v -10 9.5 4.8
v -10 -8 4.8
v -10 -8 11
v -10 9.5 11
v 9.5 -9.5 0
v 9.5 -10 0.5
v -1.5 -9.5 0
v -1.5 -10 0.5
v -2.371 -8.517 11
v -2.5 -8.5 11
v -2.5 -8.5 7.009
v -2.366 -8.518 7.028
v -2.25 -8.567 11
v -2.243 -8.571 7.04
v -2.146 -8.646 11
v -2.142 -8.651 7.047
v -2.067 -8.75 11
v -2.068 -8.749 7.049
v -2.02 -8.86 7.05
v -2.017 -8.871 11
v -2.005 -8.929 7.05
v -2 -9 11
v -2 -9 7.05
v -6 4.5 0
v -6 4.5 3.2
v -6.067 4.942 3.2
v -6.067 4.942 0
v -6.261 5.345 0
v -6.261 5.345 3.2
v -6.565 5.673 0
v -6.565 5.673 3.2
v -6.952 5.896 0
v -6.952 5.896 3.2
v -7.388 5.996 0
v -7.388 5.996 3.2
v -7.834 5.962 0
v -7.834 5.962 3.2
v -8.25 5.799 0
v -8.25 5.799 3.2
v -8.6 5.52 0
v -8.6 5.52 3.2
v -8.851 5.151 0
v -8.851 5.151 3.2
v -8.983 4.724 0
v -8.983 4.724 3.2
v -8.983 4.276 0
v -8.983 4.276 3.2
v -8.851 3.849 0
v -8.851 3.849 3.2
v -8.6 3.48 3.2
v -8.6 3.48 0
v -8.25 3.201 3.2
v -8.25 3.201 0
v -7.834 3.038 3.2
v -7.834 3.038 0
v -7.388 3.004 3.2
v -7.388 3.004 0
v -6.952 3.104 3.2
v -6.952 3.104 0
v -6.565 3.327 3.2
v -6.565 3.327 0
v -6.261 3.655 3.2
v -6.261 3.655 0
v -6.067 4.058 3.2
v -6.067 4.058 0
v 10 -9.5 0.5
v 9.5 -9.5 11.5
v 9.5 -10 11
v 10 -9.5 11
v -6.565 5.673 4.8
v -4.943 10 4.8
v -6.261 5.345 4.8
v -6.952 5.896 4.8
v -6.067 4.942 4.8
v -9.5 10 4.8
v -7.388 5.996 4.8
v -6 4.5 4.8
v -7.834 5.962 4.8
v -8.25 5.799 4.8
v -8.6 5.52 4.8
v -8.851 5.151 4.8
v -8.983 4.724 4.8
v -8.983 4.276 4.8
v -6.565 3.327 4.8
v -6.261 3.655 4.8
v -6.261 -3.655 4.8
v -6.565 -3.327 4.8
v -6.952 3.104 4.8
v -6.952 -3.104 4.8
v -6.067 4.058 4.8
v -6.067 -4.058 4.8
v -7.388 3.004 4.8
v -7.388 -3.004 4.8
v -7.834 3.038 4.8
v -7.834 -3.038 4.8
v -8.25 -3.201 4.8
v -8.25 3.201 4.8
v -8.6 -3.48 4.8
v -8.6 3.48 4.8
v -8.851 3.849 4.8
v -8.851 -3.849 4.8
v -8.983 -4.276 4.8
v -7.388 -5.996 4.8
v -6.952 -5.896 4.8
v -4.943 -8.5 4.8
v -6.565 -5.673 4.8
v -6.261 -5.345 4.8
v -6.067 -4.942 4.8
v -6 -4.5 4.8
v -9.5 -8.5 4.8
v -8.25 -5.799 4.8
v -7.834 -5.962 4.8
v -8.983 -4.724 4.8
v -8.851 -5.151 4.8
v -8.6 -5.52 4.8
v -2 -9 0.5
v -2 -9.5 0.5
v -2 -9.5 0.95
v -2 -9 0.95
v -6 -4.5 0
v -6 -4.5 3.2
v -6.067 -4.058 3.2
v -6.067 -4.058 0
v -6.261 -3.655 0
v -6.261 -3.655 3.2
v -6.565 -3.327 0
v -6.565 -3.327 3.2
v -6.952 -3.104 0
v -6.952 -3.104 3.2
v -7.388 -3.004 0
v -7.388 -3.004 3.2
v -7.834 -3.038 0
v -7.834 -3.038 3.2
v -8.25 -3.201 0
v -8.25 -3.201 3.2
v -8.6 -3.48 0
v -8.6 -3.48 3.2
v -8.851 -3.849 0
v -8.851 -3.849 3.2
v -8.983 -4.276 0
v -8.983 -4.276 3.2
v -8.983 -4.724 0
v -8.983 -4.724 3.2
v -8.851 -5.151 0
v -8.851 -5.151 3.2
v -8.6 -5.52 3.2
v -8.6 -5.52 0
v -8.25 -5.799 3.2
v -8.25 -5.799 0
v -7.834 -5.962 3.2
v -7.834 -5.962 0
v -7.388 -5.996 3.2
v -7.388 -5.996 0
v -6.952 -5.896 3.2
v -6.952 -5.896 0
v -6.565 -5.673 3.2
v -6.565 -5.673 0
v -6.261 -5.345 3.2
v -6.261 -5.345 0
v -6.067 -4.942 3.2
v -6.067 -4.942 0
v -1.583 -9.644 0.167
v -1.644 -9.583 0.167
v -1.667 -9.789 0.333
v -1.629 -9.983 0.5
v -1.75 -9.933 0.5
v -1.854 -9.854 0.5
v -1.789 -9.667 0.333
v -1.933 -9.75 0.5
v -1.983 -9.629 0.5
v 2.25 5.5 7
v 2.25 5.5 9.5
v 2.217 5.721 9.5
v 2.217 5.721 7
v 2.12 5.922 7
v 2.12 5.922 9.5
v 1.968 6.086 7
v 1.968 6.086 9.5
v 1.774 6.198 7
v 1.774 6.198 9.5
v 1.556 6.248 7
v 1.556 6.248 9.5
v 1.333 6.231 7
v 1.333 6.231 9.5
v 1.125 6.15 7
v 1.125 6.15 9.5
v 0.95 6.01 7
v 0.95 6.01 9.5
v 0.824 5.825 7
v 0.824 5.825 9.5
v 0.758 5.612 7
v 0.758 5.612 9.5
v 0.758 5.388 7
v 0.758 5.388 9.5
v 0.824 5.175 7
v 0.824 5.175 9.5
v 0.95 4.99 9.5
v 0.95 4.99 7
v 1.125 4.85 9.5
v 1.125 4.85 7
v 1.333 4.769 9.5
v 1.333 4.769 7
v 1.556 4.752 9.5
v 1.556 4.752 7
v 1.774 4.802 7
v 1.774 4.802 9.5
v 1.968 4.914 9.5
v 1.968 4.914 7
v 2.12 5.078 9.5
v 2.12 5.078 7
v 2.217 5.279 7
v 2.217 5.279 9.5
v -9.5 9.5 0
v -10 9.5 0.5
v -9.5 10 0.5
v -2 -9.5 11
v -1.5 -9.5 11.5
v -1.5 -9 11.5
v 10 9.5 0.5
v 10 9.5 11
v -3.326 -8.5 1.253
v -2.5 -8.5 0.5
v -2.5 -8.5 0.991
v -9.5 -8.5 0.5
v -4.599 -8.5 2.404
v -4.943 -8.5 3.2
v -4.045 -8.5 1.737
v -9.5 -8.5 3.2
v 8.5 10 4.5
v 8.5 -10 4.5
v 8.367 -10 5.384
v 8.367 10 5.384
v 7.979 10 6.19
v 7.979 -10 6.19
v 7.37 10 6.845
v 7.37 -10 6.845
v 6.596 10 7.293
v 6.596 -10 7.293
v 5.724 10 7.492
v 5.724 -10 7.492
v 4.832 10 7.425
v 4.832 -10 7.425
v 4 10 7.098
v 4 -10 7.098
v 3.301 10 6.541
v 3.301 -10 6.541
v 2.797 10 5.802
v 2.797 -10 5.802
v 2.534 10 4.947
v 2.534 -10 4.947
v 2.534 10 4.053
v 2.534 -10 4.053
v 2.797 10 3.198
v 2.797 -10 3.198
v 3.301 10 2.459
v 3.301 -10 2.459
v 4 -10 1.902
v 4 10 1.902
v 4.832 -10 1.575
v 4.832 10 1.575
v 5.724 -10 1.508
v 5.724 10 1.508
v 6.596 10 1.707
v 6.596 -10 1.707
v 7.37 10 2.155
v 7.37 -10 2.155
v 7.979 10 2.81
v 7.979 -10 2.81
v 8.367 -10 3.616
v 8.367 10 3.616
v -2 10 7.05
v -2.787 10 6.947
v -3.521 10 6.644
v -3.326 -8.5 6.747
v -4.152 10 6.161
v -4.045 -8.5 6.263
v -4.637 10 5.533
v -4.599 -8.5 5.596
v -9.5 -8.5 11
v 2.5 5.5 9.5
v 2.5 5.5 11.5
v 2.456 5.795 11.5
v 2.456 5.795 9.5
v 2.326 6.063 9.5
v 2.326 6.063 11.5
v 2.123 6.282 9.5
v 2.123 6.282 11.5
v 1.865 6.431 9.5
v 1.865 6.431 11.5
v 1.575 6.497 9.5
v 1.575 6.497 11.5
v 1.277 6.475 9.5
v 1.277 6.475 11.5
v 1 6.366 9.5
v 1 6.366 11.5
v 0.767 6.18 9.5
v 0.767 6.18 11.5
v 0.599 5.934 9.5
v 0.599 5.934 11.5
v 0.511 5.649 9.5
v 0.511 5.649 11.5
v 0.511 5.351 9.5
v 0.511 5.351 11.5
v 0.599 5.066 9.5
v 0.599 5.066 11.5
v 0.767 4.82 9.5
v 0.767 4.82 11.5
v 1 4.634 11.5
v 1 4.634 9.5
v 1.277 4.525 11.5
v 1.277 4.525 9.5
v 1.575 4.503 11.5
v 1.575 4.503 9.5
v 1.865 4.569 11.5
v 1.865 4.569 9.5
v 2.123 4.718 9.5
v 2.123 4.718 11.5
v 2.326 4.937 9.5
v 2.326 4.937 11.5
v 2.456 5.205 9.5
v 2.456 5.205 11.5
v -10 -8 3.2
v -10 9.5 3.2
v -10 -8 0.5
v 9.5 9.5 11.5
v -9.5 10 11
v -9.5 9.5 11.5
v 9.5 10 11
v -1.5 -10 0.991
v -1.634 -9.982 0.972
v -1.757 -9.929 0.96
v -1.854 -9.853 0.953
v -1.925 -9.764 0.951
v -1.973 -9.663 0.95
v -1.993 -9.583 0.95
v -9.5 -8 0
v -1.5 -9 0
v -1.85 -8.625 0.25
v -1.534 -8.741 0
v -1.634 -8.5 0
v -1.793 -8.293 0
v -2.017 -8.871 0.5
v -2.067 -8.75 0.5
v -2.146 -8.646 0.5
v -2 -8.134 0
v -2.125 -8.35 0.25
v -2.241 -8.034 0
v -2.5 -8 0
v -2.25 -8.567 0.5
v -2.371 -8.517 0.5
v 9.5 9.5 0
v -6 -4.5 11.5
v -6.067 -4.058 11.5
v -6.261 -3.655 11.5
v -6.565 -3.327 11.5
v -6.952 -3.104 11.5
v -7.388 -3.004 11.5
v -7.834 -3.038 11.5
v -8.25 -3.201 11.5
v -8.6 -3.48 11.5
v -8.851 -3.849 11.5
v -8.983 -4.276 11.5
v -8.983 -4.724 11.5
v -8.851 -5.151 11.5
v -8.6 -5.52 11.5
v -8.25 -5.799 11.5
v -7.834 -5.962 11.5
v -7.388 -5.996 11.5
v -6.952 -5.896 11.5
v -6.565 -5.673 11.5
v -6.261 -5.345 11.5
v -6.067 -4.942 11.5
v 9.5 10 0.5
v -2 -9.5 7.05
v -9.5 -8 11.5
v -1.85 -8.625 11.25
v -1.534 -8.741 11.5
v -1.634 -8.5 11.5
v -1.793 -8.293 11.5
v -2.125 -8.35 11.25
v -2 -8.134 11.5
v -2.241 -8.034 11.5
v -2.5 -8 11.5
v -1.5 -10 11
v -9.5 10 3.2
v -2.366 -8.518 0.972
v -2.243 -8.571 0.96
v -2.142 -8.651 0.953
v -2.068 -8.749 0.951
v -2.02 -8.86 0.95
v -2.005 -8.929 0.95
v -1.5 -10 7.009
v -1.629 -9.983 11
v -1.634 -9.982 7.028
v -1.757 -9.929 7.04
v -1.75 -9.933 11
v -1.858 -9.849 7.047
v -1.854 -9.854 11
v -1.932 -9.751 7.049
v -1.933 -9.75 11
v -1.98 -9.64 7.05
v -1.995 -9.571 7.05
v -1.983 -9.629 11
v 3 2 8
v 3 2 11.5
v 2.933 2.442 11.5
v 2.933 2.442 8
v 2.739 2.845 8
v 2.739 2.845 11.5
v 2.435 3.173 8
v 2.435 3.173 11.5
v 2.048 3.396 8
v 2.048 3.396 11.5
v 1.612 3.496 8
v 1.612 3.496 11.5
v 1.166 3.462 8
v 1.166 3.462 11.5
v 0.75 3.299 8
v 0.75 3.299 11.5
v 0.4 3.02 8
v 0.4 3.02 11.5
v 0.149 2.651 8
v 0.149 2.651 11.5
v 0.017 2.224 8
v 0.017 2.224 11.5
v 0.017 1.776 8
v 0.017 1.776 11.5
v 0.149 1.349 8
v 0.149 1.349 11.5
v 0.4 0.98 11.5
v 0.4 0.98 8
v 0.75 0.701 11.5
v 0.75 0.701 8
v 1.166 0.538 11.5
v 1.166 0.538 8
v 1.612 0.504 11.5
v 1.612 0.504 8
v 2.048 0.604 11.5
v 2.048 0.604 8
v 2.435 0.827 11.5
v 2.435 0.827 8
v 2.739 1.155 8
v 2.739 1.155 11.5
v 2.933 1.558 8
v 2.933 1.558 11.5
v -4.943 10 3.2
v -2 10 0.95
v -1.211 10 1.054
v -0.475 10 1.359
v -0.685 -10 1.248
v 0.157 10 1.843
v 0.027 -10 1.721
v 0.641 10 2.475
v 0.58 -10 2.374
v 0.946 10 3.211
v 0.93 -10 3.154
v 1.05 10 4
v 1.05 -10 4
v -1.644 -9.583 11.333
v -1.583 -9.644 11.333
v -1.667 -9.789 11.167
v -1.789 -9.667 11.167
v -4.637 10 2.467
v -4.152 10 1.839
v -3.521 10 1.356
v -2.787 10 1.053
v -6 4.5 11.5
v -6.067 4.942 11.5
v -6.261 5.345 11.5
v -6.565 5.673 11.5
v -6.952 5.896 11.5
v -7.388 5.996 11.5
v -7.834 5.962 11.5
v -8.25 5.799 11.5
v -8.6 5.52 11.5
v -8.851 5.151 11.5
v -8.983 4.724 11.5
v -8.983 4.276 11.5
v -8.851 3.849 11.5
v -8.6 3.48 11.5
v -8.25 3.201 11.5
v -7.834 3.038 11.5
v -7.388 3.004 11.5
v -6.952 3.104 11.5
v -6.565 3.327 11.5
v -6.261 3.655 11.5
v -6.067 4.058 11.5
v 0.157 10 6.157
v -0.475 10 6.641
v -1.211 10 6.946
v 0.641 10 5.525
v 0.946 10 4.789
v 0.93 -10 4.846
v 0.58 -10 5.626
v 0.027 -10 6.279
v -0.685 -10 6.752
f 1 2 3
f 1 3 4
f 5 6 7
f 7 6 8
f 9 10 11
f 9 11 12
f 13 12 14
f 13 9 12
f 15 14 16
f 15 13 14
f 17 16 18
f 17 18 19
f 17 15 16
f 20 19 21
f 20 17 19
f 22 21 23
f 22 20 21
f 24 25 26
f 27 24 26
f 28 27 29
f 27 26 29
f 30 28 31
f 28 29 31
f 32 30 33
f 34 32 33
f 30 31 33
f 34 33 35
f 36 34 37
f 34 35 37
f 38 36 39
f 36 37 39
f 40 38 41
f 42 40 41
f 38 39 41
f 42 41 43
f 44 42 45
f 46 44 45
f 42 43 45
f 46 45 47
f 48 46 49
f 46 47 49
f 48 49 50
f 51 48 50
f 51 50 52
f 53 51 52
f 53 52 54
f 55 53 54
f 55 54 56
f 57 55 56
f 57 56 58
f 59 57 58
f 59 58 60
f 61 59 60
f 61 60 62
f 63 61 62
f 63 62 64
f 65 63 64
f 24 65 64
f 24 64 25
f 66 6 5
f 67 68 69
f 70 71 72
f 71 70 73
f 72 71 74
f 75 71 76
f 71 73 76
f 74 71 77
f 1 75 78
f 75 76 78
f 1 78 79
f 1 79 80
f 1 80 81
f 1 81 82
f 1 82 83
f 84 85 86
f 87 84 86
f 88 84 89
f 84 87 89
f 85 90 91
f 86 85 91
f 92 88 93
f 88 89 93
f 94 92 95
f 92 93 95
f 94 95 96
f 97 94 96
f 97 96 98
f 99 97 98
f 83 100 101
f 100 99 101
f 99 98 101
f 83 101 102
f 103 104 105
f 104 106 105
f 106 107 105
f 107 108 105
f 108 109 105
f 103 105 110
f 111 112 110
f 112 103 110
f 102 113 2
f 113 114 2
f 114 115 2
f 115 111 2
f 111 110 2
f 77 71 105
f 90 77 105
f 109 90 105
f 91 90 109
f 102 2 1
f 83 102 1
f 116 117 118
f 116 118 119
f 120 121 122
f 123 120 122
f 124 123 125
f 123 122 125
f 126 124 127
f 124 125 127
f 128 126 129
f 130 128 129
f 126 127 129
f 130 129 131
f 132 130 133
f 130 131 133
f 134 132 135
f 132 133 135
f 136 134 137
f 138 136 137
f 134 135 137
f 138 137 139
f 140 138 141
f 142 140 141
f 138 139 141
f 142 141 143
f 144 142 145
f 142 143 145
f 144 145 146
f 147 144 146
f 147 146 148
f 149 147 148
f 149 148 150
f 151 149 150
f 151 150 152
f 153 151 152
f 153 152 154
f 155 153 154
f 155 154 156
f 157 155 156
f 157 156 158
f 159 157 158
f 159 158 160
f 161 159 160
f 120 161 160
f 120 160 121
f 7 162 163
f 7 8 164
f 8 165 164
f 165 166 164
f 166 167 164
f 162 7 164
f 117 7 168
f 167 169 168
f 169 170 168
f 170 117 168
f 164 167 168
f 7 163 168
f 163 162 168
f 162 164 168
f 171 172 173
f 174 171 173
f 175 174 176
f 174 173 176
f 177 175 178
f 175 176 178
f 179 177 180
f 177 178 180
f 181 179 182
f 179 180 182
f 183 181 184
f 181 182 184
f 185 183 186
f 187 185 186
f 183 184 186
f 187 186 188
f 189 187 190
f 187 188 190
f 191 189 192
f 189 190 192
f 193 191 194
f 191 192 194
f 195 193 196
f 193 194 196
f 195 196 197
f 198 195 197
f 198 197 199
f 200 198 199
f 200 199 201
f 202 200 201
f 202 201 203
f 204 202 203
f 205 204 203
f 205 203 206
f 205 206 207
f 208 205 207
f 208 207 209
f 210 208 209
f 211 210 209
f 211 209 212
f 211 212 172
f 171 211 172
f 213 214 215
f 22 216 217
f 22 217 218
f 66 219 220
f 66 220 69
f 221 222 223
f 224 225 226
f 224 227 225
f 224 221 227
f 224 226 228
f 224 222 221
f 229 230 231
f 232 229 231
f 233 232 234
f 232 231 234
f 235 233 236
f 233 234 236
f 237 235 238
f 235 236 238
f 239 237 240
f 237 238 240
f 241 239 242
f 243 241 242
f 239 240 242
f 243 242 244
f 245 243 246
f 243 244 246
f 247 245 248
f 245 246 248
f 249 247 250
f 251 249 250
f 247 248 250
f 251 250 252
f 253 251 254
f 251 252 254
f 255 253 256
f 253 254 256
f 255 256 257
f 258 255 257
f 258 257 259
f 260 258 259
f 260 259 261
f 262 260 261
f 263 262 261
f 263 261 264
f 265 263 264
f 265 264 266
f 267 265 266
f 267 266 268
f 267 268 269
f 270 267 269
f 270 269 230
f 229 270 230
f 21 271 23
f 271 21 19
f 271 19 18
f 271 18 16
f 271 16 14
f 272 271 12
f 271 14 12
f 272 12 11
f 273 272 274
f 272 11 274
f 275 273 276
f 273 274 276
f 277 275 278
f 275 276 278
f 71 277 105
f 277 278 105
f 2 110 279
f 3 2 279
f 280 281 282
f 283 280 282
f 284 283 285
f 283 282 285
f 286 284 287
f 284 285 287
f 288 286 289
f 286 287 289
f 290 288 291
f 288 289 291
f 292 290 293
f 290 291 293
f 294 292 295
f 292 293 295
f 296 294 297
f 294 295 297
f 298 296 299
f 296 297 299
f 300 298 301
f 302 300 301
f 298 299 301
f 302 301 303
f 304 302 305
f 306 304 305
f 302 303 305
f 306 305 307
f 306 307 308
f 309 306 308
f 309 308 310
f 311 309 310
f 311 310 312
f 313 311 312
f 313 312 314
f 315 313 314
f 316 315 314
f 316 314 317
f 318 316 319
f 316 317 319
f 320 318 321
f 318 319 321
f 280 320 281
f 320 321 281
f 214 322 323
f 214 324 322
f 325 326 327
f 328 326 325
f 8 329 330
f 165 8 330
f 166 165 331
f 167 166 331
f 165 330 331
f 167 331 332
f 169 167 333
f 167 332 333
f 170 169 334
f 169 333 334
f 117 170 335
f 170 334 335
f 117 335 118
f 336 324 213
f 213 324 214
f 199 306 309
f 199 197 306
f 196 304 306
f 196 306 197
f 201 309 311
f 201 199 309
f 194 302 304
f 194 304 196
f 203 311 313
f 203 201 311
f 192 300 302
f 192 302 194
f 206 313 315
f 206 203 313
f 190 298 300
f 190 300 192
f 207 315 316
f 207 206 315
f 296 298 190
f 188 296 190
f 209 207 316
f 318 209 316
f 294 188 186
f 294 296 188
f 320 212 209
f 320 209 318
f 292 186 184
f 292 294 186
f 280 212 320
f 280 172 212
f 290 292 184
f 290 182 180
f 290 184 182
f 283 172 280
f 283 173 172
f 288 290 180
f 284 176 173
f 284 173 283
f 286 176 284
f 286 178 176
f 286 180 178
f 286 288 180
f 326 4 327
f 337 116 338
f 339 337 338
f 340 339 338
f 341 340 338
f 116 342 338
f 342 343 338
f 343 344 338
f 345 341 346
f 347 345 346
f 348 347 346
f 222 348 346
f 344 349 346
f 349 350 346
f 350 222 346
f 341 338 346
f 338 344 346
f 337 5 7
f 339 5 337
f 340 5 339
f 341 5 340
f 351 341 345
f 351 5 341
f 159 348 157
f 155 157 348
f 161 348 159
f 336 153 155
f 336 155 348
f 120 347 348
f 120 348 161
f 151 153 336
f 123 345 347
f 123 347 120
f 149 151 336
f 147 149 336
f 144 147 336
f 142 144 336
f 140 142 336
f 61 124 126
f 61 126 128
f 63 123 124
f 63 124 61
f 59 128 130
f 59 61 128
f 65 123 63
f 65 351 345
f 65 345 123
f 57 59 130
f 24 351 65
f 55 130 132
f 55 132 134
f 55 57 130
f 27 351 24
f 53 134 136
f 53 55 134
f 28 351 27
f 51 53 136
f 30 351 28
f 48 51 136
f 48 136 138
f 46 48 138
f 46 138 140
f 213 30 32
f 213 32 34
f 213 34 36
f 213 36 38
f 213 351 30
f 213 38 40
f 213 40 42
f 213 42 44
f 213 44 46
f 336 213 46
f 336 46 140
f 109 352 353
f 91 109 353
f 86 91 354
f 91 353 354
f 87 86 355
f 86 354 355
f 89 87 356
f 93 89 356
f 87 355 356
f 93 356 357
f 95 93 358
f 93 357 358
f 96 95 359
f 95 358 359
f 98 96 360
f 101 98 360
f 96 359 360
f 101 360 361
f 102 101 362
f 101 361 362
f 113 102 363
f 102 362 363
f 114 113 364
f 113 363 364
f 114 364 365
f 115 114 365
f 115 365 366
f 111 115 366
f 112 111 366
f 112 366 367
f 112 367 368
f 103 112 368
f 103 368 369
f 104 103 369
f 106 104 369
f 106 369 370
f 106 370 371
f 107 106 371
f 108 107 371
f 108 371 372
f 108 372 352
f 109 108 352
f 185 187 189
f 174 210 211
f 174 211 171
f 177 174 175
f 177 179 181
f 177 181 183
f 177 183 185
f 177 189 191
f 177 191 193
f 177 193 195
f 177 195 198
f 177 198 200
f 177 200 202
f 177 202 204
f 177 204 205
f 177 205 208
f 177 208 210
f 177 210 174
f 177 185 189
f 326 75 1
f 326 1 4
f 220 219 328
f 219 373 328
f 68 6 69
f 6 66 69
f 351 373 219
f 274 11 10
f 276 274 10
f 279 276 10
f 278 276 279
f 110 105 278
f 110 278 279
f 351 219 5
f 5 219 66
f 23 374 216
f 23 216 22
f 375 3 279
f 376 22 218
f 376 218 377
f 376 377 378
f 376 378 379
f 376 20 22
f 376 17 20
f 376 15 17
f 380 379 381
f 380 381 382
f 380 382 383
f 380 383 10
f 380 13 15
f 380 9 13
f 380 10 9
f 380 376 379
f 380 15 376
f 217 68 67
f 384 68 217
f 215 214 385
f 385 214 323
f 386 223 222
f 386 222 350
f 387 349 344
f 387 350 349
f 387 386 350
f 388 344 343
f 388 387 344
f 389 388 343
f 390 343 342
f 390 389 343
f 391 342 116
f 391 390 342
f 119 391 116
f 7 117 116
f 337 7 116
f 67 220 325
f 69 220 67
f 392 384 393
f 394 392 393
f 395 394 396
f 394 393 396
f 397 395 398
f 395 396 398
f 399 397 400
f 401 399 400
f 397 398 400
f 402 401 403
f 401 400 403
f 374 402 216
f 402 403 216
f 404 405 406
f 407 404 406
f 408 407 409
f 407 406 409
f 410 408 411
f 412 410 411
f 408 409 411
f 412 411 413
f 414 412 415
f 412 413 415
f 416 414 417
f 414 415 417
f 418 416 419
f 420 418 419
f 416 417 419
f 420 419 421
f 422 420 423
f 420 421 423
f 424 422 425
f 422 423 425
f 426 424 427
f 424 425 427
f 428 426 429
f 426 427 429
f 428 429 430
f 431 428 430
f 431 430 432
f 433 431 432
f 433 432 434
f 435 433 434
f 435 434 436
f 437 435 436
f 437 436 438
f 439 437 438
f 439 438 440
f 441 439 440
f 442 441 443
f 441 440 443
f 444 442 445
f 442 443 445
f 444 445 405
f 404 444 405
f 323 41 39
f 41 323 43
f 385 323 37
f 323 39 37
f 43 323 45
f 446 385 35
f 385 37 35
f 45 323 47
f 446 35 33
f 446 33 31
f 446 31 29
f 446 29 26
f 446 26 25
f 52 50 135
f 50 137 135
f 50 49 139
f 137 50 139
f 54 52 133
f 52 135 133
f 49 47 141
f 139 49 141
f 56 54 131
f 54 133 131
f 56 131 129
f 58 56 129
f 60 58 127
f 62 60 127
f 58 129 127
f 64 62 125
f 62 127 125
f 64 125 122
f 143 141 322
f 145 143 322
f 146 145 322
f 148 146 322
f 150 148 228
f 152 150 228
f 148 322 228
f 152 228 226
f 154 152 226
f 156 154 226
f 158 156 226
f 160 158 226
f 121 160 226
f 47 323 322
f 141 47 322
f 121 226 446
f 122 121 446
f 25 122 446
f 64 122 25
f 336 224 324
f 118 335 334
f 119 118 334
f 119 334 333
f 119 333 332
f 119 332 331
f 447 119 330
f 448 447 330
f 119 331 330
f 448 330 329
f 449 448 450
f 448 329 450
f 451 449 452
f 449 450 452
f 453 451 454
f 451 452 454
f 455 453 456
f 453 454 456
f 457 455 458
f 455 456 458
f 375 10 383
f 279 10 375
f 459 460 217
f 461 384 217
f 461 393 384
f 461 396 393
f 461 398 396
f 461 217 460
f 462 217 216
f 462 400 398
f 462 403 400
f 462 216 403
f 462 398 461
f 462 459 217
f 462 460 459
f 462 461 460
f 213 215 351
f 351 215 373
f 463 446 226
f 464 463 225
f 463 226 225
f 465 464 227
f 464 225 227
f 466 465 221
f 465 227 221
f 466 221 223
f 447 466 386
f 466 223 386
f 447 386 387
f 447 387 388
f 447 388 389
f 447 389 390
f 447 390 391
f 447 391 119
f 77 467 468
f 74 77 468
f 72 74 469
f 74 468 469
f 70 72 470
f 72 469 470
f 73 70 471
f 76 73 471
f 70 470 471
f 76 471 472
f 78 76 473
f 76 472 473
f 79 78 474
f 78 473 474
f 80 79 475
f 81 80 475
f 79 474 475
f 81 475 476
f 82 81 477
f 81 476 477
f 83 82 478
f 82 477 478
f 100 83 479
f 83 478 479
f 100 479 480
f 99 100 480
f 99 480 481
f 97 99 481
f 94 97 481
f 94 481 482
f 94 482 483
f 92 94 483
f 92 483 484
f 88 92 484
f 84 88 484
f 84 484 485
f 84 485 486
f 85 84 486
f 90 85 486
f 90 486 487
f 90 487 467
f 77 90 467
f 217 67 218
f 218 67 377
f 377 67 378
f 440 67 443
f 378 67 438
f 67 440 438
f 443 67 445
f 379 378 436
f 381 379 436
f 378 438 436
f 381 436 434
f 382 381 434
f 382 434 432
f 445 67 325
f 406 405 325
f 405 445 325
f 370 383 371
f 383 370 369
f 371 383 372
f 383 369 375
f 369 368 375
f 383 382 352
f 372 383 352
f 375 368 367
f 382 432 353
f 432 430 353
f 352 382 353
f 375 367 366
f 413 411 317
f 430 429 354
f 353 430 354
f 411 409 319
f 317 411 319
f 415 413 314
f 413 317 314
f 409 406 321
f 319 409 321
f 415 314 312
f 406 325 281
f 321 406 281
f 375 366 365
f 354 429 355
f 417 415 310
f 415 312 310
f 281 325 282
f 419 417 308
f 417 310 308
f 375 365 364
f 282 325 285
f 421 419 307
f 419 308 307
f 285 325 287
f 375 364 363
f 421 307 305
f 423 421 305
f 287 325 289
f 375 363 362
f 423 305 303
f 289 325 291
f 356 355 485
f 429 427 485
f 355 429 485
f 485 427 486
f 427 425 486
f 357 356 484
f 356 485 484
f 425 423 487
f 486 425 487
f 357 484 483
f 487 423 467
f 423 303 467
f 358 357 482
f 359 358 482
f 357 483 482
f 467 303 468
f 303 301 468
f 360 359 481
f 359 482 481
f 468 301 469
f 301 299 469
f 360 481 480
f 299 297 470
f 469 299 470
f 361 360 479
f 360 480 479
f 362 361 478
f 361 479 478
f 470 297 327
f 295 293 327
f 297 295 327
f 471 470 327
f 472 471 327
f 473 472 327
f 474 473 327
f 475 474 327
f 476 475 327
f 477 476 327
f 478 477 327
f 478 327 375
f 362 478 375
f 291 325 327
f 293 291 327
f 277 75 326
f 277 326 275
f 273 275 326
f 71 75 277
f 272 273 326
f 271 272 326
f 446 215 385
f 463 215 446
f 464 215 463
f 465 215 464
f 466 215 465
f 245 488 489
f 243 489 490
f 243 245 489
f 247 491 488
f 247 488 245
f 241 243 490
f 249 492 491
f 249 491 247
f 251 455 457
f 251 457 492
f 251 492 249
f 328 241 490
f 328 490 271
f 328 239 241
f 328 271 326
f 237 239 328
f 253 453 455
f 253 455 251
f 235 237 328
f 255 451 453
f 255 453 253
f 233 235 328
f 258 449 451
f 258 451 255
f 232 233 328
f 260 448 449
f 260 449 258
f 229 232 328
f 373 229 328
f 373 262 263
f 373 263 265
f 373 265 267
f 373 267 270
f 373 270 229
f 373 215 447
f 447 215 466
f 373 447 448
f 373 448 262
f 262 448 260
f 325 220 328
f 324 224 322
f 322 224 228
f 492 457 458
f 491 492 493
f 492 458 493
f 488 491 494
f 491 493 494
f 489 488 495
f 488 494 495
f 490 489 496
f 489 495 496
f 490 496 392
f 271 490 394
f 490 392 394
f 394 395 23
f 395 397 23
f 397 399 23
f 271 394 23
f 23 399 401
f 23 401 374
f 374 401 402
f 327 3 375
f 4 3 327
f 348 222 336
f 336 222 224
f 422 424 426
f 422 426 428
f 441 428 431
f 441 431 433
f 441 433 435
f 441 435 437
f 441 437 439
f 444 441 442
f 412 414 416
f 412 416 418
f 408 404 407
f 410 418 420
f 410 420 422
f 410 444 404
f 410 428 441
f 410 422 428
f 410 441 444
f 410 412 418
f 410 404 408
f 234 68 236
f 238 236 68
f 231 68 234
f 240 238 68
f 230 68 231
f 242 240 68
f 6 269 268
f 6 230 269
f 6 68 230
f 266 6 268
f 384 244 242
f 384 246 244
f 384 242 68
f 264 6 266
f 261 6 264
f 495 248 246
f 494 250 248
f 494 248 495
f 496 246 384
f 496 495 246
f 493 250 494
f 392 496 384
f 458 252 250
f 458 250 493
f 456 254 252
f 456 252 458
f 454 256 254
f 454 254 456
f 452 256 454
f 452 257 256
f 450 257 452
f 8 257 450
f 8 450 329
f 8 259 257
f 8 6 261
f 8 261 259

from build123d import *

# Parameters (mm, degrees)
BOSS_EXTRUDE1_DEPTH = 11.5
SKETCH2_R           = 1.5
CUT_EXTRUDE1_DEPTH  = 19.227726134
SKETCH2_3_R         = 0.75
CUT_EXTRUDE2_DEPTH  = 4.5
SKETCH2_4_R         = 1
CUT_EXTRUDE3_DEPTH  = 2
SKETCH2_5_R         = 1.5
CUT_EXTRUDE4_DEPTH  = 3.5
CUT_EXTRUDE5_DEPTH  = 26.144581921
SKETCH3_4_R         = 3
CUT_EXTRUDE6_DEPTH  = 26.144581921
FILLET1_R           = 0.5
CHAMFER1_SIZE       = 0.5


with BuildPart() as part:
    # Sketch1 → Boss-Extrude1 (new body)
    with BuildSketch(Plane.XY):
        Polygon((-10, 10), (10, 10), (10, -10), (-2, -10), (-2, -8.5), (-10, -8.5), align=None)
    extrude(amount=BOSS_EXTRUDE1_DEPTH)

    # Sketch2 → Cut-Extrude1 (cut, through all)
    with BuildSketch(Plane.XY.offset(11.5)):
        with Locations((-7.5, 4.5)):
            Circle(SKETCH2_R)
        with Locations((-7.5, -4.5)):
            Circle(SKETCH2_R)
    extrude(amount=-CUT_EXTRUDE1_DEPTH, mode=Mode.SUBTRACT)

    # Sketch2<3> → Cut-Extrude2 (cut)
    with BuildSketch(Plane.XY.offset(11.5)):
        with Locations((1.5, 5.5)):
            Circle(SKETCH2_3_R)
    extrude(amount=-CUT_EXTRUDE2_DEPTH, mode=Mode.SUBTRACT)

    # Sketch2<4> → Cut-Extrude3 (cut)
    with BuildSketch(Plane.XY.offset(11.5)):
        with Locations((1.5, 5.5)):
            Circle(SKETCH2_4_R)
    extrude(amount=-CUT_EXTRUDE3_DEPTH, mode=Mode.SUBTRACT)

    # Sketch2<5> → Cut-Extrude4 (cut)
    with BuildSketch(Plane.XY.offset(11.5)):
        with Locations((1.5, 2)):
            Circle(SKETCH2_5_R)
    extrude(amount=-CUT_EXTRUDE4_DEPTH, mode=Mode.SUBTRACT)

    # Sketch3 → Cut-Extrude5 (cut, through all)
    with BuildSketch(Plane.XZ.offset(10)):
        with BuildLine():
            Line((-4.943212531, 4.8), (-10, 4.8))
            Line((-10, 4.8), (-10, 3.2))
            Line((-10, 3.2), (-4.943212531, 3.2))
            ThreePointArc((-4.943212531, 3.2), (1.05, 4), (-4.943212531, 4.8))
        make_face()
    extrude(amount=-CUT_EXTRUDE5_DEPTH, mode=Mode.SUBTRACT)

    # Sketch3<4> → Cut-Extrude6 (cut, through all)
    with BuildSketch(Plane.XZ.offset(10)):
        with Locations((5.5, 4.5)):
            Circle(SKETCH3_4_R)
    extrude(amount=-CUT_EXTRUDE6_DEPTH, mode=Mode.SUBTRACT)

    # Fillet1
    fillet1_edges = [part.edges().sort_by_distance(p)[0] for p in [
        (-2, -8.5, 0.475),
        (-2, -10, 9.275),
        (-2, -8.5, 9.275),
        (-2, -10, 0.475),
    ]]
    fillet(fillet1_edges, radius=FILLET1_R)

    # Chamfer1
    chamfer1_edges = [part.edges().sort_by_distance(p)[0] for p in [
        (4.25, -10, 0),
        (-6.25, -8.5, 11.5),
        (-1.853553391, -9.853553391, 0),
        (-2.146446609, -8.646446609, 11.5),
        (-2, -9.25, 0),
        (-2, -9.25, 11.5),
        (-2.146446609, -8.646446609, 0),
        (-1.853553391, -9.853553391, 11.5),
        (10, 10, 5.75),
        (-6.25, -8.5, 0),
        (-10, -8.5, 1.6),
        (-10, 0.75, 0),
        (-10, 10, 1.6),
        (0, 10, 0),
        (10, 0, 0),
        (10, -10, 5.75),
        (-10, -8.5, 8.15),
        (-10, 10, 8.15),
        (-10, 0.75, 11.5),
        (0, 10, 11.5),
        (10, 0, 11.5),
        (4.25, -10, 11.5),
    ]]
    chamfer(chamfer1_edges, length=CHAMFER1_SIZE)


solid = part.part
